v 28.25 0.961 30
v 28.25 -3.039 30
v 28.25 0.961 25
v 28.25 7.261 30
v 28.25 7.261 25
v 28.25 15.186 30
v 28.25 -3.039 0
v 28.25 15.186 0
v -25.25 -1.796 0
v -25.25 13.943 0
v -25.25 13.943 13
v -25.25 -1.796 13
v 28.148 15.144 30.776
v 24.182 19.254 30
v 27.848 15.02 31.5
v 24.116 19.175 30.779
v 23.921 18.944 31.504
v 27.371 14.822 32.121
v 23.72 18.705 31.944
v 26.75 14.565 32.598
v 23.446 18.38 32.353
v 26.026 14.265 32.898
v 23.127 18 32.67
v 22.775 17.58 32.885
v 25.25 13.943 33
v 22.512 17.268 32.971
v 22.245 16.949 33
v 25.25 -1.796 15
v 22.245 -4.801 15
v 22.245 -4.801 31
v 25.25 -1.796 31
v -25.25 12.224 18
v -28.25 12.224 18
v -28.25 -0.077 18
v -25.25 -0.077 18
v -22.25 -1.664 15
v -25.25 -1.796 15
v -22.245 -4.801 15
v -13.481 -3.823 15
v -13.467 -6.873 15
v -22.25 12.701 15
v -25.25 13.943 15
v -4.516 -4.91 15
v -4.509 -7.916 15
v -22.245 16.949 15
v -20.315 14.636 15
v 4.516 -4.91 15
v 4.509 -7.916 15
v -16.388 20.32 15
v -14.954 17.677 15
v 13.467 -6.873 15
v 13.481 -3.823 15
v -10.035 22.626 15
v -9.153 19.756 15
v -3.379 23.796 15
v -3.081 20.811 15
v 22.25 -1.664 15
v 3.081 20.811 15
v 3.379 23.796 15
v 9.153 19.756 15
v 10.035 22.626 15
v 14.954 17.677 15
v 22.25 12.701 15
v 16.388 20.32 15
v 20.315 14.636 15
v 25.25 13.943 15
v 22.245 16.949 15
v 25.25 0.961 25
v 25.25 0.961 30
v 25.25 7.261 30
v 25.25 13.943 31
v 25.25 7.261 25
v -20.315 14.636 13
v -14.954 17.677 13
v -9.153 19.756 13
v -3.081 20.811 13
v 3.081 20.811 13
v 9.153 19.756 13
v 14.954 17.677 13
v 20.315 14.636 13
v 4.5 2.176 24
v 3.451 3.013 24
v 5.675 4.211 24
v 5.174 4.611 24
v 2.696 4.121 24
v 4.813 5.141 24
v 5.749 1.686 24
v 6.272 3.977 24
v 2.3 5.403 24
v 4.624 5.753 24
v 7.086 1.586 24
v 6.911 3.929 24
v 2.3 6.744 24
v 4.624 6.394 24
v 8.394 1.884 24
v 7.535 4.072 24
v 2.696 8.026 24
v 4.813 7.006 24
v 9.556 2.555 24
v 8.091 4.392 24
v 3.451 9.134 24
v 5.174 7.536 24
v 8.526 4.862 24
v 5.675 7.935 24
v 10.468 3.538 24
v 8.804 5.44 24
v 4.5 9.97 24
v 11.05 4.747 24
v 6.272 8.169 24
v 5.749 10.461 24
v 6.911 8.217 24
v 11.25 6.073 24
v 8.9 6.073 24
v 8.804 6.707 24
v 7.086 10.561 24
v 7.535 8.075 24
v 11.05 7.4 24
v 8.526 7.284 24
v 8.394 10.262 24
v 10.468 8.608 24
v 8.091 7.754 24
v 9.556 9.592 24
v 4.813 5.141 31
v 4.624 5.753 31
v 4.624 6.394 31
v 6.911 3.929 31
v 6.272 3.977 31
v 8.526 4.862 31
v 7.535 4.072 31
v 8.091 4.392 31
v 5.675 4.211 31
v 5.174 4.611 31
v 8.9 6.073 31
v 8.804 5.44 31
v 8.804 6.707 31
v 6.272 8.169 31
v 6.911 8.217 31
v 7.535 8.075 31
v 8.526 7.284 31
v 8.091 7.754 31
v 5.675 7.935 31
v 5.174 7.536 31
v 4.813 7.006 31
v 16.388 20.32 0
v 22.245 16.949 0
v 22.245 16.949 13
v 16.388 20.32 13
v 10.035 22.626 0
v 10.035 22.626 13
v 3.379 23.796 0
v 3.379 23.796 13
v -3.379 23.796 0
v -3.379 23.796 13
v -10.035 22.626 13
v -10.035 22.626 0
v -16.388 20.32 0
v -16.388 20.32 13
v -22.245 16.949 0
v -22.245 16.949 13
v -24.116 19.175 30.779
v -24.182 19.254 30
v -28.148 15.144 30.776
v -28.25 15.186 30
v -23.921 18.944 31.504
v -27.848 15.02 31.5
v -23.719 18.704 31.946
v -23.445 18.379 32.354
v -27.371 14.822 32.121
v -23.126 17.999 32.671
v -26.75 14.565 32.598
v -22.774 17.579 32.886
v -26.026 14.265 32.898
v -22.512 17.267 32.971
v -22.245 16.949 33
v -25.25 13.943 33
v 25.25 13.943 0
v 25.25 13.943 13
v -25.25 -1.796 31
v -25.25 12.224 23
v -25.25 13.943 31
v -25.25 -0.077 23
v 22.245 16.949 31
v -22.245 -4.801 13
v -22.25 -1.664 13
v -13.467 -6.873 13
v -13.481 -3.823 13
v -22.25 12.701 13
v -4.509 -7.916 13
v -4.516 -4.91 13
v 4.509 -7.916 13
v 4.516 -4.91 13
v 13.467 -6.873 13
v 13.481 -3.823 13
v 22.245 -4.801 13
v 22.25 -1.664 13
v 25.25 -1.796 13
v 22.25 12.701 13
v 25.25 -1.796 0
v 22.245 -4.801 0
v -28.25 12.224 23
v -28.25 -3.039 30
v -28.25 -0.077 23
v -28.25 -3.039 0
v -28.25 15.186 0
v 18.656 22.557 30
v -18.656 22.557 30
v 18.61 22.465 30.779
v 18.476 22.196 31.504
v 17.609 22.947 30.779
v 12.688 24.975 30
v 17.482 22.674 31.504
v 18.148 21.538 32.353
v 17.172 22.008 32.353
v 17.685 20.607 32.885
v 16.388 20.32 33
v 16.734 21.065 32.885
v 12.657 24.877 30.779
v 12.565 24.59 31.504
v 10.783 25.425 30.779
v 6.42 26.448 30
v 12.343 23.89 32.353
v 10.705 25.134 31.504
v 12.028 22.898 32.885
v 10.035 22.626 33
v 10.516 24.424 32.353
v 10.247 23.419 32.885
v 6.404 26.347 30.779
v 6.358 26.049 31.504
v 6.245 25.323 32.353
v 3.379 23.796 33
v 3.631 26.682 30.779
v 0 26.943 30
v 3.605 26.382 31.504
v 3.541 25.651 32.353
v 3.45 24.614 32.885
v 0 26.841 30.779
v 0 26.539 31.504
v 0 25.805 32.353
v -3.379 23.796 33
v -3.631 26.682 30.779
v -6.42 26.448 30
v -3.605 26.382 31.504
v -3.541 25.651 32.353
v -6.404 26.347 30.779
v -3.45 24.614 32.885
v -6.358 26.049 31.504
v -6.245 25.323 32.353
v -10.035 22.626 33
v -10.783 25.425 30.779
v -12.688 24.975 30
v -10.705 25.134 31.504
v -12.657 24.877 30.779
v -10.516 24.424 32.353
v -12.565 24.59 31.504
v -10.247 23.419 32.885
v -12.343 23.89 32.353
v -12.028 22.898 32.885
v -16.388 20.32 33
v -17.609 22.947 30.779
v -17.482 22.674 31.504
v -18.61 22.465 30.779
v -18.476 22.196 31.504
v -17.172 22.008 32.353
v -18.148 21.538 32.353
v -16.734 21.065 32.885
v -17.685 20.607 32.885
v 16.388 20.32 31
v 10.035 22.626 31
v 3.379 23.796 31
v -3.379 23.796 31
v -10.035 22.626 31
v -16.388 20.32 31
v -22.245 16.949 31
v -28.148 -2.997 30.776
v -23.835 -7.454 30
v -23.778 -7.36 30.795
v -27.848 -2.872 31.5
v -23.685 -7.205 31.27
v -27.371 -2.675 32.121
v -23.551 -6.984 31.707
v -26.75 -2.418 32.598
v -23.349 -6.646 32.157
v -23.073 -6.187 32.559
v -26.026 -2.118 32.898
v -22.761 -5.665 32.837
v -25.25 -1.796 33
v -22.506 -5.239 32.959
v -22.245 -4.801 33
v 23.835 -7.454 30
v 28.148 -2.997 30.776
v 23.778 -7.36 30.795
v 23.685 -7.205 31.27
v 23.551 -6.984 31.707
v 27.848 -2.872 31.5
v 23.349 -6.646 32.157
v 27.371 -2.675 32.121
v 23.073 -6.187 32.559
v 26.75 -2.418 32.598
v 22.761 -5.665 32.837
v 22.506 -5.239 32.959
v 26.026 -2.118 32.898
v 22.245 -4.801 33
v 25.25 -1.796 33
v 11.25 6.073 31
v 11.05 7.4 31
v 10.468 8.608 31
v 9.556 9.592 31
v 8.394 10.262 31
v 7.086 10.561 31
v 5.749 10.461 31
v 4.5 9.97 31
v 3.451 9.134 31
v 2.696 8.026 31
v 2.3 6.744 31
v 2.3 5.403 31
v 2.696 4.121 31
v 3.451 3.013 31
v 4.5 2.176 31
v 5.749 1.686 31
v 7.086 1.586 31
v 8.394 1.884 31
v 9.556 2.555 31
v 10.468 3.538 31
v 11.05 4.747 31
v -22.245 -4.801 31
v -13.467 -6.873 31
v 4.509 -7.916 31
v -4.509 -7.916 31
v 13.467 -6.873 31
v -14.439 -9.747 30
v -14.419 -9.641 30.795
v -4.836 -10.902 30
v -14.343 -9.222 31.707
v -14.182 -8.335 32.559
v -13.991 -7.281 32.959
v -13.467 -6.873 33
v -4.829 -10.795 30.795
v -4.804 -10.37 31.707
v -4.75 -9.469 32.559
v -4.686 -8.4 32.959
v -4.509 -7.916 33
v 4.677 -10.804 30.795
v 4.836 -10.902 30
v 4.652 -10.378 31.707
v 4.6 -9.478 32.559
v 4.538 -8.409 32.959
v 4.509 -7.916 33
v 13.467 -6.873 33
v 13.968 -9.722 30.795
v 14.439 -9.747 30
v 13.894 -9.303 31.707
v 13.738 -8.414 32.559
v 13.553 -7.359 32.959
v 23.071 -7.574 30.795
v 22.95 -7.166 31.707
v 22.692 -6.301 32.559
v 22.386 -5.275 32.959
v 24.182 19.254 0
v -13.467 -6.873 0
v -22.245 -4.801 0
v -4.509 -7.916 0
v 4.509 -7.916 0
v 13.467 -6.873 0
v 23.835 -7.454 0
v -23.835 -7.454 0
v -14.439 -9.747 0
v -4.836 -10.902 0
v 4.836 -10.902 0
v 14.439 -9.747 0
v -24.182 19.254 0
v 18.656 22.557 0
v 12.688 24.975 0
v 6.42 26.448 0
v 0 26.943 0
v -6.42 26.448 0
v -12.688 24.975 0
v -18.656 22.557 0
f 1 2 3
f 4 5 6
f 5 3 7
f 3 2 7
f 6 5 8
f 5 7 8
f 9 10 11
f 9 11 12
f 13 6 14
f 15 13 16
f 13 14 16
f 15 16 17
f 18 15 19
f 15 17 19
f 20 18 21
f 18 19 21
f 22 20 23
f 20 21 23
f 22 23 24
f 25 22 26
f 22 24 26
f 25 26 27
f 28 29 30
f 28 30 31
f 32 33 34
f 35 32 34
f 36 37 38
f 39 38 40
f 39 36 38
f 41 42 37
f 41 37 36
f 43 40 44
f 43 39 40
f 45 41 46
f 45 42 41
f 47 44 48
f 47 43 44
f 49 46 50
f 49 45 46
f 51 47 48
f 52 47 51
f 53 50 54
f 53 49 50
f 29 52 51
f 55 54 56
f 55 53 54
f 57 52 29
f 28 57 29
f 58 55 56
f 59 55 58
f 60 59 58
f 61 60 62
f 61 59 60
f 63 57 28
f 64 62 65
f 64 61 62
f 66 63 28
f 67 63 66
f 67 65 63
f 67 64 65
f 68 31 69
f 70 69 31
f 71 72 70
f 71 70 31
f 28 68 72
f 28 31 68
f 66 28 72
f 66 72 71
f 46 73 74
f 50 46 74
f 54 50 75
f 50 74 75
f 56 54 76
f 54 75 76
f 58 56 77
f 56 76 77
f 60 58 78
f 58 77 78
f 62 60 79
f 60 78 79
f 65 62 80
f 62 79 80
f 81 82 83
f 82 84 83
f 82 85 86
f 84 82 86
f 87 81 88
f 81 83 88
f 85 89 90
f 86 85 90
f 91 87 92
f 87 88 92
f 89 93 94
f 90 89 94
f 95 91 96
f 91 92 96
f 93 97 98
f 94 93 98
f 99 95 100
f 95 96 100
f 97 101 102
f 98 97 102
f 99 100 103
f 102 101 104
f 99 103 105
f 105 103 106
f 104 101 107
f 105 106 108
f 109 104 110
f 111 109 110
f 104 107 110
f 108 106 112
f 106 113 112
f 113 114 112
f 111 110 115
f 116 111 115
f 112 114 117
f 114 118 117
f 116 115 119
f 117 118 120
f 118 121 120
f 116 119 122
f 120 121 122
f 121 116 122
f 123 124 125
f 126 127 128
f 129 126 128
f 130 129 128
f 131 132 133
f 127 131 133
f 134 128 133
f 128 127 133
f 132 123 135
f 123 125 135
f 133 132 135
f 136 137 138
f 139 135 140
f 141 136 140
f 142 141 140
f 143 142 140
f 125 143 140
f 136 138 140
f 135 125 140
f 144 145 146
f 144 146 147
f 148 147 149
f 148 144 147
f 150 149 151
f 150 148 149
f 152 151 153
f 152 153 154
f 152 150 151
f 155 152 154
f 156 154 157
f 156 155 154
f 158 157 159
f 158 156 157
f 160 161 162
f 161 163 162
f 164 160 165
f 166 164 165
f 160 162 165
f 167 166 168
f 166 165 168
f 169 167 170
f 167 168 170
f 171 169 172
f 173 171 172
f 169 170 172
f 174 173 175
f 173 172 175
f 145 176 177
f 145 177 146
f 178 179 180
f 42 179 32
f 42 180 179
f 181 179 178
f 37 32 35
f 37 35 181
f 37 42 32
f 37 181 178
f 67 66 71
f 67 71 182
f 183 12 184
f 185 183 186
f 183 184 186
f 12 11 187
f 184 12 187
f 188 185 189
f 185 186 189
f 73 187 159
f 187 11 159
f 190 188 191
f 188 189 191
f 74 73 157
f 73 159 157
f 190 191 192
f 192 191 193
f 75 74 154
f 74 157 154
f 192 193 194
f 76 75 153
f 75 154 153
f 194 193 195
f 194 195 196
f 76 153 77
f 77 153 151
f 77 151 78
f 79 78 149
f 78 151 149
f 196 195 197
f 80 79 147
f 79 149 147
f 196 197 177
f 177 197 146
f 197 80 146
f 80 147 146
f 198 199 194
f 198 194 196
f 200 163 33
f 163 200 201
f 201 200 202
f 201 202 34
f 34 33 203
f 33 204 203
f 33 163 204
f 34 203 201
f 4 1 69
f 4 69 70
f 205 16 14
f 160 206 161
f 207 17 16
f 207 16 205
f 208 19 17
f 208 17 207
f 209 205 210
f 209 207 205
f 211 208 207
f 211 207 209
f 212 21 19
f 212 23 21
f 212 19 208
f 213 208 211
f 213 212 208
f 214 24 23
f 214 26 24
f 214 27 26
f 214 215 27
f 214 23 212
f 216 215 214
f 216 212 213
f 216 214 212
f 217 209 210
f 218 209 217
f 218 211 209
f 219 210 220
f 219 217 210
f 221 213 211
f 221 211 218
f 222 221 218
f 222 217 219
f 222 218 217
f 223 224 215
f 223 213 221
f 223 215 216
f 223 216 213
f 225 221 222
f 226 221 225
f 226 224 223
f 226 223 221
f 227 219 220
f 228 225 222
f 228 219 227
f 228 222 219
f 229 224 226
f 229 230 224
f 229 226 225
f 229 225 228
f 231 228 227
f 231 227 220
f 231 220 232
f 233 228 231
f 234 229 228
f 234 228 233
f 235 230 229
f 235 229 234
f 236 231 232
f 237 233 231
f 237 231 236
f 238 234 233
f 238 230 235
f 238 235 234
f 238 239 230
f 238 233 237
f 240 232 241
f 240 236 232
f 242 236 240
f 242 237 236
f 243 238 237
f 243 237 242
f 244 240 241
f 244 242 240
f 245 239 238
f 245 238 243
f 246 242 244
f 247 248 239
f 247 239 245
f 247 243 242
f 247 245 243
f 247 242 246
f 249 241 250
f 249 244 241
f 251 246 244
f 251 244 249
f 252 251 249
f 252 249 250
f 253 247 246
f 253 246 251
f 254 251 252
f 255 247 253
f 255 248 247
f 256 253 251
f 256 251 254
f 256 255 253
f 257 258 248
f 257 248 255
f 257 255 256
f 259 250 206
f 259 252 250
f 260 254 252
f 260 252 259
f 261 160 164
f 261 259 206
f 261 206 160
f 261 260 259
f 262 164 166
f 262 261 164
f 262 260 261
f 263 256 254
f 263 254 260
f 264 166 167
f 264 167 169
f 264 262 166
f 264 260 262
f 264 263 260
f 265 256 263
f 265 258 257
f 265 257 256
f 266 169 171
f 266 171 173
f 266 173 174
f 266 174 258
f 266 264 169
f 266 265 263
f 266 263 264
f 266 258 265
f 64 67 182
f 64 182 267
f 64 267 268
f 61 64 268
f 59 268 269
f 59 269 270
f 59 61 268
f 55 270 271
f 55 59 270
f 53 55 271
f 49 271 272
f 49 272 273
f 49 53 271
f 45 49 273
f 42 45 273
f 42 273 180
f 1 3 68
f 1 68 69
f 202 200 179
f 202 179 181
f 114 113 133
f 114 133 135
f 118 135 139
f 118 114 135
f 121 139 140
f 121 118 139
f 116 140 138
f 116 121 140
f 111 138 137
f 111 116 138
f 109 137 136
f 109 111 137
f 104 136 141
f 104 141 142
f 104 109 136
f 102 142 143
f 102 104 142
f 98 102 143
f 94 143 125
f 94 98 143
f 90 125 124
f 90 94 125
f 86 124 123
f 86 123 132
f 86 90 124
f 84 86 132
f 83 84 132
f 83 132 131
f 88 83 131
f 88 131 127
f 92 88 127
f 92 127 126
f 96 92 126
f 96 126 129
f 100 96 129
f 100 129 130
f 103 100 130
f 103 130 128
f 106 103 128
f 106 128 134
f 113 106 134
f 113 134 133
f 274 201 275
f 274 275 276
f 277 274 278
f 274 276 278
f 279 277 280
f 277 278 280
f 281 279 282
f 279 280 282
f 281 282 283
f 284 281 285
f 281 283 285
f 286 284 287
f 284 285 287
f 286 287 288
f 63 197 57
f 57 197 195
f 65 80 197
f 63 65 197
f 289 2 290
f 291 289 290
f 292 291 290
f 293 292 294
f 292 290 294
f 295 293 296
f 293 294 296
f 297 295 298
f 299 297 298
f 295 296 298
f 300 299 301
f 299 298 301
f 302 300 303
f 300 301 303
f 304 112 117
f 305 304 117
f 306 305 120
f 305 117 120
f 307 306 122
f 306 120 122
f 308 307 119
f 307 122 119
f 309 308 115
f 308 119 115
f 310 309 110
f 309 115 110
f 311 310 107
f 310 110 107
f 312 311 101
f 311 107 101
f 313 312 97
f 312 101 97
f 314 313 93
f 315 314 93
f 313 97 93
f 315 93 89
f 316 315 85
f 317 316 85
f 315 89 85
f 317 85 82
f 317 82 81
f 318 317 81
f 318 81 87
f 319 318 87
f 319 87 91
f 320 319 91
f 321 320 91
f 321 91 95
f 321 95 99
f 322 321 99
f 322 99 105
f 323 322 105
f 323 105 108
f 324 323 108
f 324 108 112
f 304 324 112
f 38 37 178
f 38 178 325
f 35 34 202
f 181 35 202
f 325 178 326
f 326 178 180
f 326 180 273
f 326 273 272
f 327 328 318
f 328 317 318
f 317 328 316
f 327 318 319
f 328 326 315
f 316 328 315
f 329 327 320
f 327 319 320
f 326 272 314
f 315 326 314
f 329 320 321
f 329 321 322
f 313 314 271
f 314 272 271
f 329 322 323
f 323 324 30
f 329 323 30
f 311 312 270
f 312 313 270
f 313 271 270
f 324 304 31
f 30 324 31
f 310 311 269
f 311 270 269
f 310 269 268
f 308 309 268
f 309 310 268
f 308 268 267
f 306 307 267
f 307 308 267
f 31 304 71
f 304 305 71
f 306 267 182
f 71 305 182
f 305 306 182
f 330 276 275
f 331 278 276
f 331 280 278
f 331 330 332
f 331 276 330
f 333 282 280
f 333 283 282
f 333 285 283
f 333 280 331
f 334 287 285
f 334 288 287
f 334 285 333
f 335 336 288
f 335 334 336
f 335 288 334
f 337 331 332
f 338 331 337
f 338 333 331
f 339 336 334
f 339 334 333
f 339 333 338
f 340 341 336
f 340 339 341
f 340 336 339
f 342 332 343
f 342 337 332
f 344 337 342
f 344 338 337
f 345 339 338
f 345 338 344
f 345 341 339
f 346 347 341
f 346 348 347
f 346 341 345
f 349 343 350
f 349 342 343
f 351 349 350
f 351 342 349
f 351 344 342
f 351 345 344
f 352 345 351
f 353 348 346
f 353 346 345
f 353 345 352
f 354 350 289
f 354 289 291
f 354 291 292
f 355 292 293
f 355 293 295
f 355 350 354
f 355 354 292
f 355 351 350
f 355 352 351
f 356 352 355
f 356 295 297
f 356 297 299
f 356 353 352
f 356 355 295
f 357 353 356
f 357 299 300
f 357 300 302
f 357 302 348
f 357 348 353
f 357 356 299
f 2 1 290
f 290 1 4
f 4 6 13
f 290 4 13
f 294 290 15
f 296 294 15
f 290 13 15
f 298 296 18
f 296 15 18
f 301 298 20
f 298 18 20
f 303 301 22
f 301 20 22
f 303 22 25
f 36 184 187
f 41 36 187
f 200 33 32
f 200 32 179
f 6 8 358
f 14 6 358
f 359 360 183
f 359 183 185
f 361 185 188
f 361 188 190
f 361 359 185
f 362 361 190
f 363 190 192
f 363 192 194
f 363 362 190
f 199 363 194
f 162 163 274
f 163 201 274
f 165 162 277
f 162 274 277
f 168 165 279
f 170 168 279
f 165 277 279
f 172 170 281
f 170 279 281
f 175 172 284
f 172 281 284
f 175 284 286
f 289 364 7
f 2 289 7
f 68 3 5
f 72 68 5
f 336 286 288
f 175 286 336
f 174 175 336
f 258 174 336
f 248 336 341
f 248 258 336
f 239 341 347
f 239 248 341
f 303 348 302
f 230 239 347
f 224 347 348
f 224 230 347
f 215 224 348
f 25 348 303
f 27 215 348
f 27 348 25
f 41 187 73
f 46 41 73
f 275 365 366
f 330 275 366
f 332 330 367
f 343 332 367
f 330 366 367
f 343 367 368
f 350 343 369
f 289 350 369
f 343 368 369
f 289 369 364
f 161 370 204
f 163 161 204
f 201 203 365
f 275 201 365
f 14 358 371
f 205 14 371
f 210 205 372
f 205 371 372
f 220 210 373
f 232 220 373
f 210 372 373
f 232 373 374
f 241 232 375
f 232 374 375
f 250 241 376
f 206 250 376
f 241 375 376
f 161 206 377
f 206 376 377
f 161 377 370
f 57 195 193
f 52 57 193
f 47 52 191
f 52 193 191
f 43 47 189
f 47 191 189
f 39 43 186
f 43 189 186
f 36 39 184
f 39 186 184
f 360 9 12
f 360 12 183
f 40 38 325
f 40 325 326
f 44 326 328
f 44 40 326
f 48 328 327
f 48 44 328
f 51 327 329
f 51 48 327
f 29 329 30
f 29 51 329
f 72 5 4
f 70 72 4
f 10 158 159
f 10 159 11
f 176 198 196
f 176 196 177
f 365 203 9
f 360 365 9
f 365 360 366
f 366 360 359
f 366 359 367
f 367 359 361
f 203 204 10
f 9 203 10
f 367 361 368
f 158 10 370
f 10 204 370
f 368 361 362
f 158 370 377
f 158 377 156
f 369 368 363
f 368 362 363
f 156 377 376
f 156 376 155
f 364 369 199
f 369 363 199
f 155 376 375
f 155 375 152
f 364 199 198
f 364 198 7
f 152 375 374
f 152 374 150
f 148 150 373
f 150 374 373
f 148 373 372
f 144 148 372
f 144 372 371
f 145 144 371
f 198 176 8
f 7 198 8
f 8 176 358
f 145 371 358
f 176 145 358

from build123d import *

# Parameters (mm, degrees)
F0_R      = 4.5
F0_R_2    = 2.15
F1_DEPTH  = 33
F2_DEPTH  = 31
F3_DEPTH  = 15
F4_DEPTH  = 13
F5_DEPTH  = 31
F6_R      = 3
F7_DEPTH  = 24
F8_W      = 6.3
F8_H      = 5
F9_DEPTH  = 4
F10_W     = 12.3
F10_H     = 5
F11_DEPTH = 4


with BuildPart() as f1:
    # F0 (on Top) → F1 (new body)
    with BuildSketch(Plane.XY):
        with BuildLine():
            Line((28.25, -3.038874), (28.25, 15.186))
            Line((28.25, 15.186), (24.182373, 19.253627))
            ThreePointArc((24.182373, 19.253627), (0, 26.943359), (-24.182373, 19.253627))
            Line((-24.182373, 19.253627), (-28.25, 15.186))
            Line((-28.25, 15.186), (-28.25, -3.038874))
            Line((-28.25, -3.038874), (-23.834695, -7.454179))
            ThreePointArc((-23.834695, -7.454179), (0, -11.046233), (23.834695, -7.454179))
            Line((23.834695, -7.454179), (28.25, -3.038874))
        make_face()
        with BuildLine():
            Line((-22.244796, -4.801437), (-25.25, -1.796233))
            Line((-25.25, -1.796233), (-25.25, 13.943359))
            Line((-25.25, 13.943359), (-22.244796, 16.948563))
            ThreePointArc((-22.244796, 16.948563), (0, 23.943359), (22.244796, 16.948563))
            Line((22.244796, 16.948563), (25.25, 13.943359))
            Line((25.25, 13.943359), (25.25, -1.796233))
            Line((25.25, -1.796233), (22.244796, -4.801437))
            ThreePointArc((22.244796, -4.801437), (0, -8.046233), (-22.244796, -4.801437))
        make_face(mode=Mode.SUBTRACT)
        with BuildLine():
            Line((-25.25, 13.943359), (-25.25, -1.796233))
            Line((-25.25, -1.796233), (-22.244796, -4.801437))
            ThreePointArc((-22.244796, -4.801437), (0, -8.046233), (22.244796, -4.801437))
            Line((22.244796, -4.801437), (25.25, -1.796233))
            Line((25.25, -1.796233), (25.25, 13.943359))
            Line((25.25, 13.943359), (22.244796, 16.948563))
            ThreePointArc((22.244796, 16.948563), (0, 23.943359), (-22.244796, 16.948563))
            Line((-22.244796, 16.948563), (-25.25, 13.943359))
        make_face()
        with BuildLine():
            Line((20.314515, 14.636203), (22.25, 12.700719))
            Line((22.25, 12.700719), (22.25, -1.663785))
            ThreePointArc((22.25, -1.663785), (0, -5.046233), (-22.25, -1.663785))
            Line((-22.25, -1.663785), (-22.25, 12.700719))
            Line((-22.25, 12.700719), (-20.314515, 14.636203))
            ThreePointArc((-20.314515, 14.636203), (0, 20.943359), (20.314515, 14.636203))
        make_face(mode=Mode.SUBTRACT)
        with BuildLine():
            Line((22.25, -1.663785), (22.25, 12.700719))
            Line((22.25, 12.700719), (20.314515, 14.636203))
            ThreePointArc((20.314515, 14.636203), (0, 20.943359), (-20.314515, 14.636203))
            Line((-20.314515, 14.636203), (-22.25, 12.700719))
            Line((-22.25, 12.700719), (-22.25, -1.663785))
            ThreePointArc((-22.25, -1.663785), (0, -5.046233), (22.25, -1.663785))
        make_face()
        with Locations((6.75, 6.073359)):
            Circle(F0_R, mode=Mode.SUBTRACT)
        with Locations((6.75, 6.073359)):
            Circle(F0_R)
        with Locations((6.75, 6.073359)):
            Circle(F0_R_2, mode=Mode.SUBTRACT)
        with Locations((6.75, 6.073359)):
            Circle(F0_R_2)
    extrude(amount=F1_DEPTH)

    # F0 (on Top) → F2 (cut)
    with BuildSketch(Plane.XY):
        with BuildLine():
            Line((-25.25, 13.943359), (-25.25, -1.796233))
            Line((-25.25, -1.796233), (-22.244796, -4.801437))
            ThreePointArc((-22.244796, -4.801437), (0, -8.046233), (22.244796, -4.801437))
            Line((22.244796, -4.801437), (25.25, -1.796233))
            Line((25.25, -1.796233), (25.25, 13.943359))
            Line((25.25, 13.943359), (22.244796, 16.948563))
            ThreePointArc((22.244796, 16.948563), (0, 23.943359), (-22.244796, 16.948563))
            Line((-22.244796, 16.948563), (-25.25, 13.943359))
        make_face()
        with BuildLine():
            Line((20.314515, 14.636203), (22.25, 12.700719))
            Line((22.25, 12.700719), (22.25, -1.663785))
            ThreePointArc((22.25, -1.663785), (0, -5.046233), (-22.25, -1.663785))
            Line((-22.25, -1.663785), (-22.25, 12.700719))
            Line((-22.25, 12.700719), (-20.314515, 14.636203))
            ThreePointArc((-20.314515, 14.636203), (0, 20.943359), (20.314515, 14.636203))
        make_face(mode=Mode.SUBTRACT)
        with BuildLine():
            Line((22.25, -1.663785), (22.25, 12.700719))
            Line((22.25, 12.700719), (20.314515, 14.636203))
            ThreePointArc((20.314515, 14.636203), (0, 20.943359), (-20.314515, 14.636203))
            Line((-20.314515, 14.636203), (-22.25, 12.700719))
            Line((-22.25, 12.700719), (-22.25, -1.663785))
            ThreePointArc((-22.25, -1.663785), (0, -5.046233), (22.25, -1.663785))
        make_face()
        with Locations((6.75, 6.073359)):
            Circle(F0_R, mode=Mode.SUBTRACT)
    extrude(amount=F2_DEPTH, mode=Mode.SUBTRACT)

    # F0 (on Top) → F3 (join)
    with BuildSketch(Plane.XY):
        with BuildLine():
            Line((-25.25, 13.943359), (-25.25, -1.796233))
            Line((-25.25, -1.796233), (-22.244796, -4.801437))
            ThreePointArc((-22.244796, -4.801437), (0, -8.046233), (22.244796, -4.801437))
            Line((22.244796, -4.801437), (25.25, -1.796233))
            Line((25.25, -1.796233), (25.25, 13.943359))
            Line((25.25, 13.943359), (22.244796, 16.948563))
            ThreePointArc((22.244796, 16.948563), (0, 23.943359), (-22.244796, 16.948563))
            Line((-22.244796, 16.948563), (-25.25, 13.943359))
        make_face()
        with BuildLine():
            Line((20.314515, 14.636203), (22.25, 12.700719))
            Line((22.25, 12.700719), (22.25, -1.663785))
            ThreePointArc((22.25, -1.663785), (0, -5.046233), (-22.25, -1.663785))
            Line((-22.25, -1.663785), (-22.25, 12.700719))
            Line((-22.25, 12.700719), (-20.314515, 14.636203))
            ThreePointArc((-20.314515, 14.636203), (0, 20.943359), (20.314515, 14.636203))
        make_face(mode=Mode.SUBTRACT)
    extrude(amount=F3_DEPTH)

    # F0 (on Top) → F4 (cut)
    with BuildSketch(Plane.XY):
        with BuildLine():
            Line((-25.25, 13.943359), (-25.25, -1.796233))
            Line((-25.25, -1.796233), (-22.244796, -4.801437))
            ThreePointArc((-22.244796, -4.801437), (0, -8.046233), (22.244796, -4.801437))
            Line((22.244796, -4.801437), (25.25, -1.796233))
            Line((25.25, -1.796233), (25.25, 13.943359))
            Line((25.25, 13.943359), (22.244796, 16.948563))
            ThreePointArc((22.244796, 16.948563), (0, 23.943359), (-22.244796, 16.948563))
            Line((-22.244796, 16.948563), (-25.25, 13.943359))
        make_face()
        with BuildLine():
            Line((20.314515, 14.636203), (22.25, 12.700719))
            Line((22.25, 12.700719), (22.25, -1.663785))
            ThreePointArc((22.25, -1.663785), (0, -5.046233), (-22.25, -1.663785))
            Line((-22.25, -1.663785), (-22.25, 12.700719))
            Line((-22.25, 12.700719), (-20.314515, 14.636203))
            ThreePointArc((-20.314515, 14.636203), (0, 20.943359), (20.314515, 14.636203))
        make_face(mode=Mode.SUBTRACT)
    extrude(amount=F4_DEPTH, mode=Mode.SUBTRACT)

    # F0 (on Top) → F5 (cut)
    with BuildSketch(Plane.XY):
        with Locations((6.75, 6.073359)):
            Circle(F0_R_2)
    extrude(amount=F5_DEPTH, mode=Mode.SUBTRACT)

    # F6
    f6_edges = [f1.edges().sort_by_distance(p)[0] for p in [
        (0, -11.046233, 33),
        (-28.25, 6.073563, 33),
        (0, 26.943359, 33),
        (28.25, 6.073563, 33),
        (-26.042347, -5.246526, 33),
        (26.042347, -5.246526, 33),
        (26.216187, 17.219813, 33),
        (-26.216187, 17.219813, 33),
    ]]
    fillet(f6_edges, radius=F6_R)

    # F0 (on Top) → F7 (cut)
    with BuildSketch(Plane.XY):
        with Locations((6.75, 6.073359)):
            Circle(F0_R)
        with Locations((6.75, 6.073359)):
            Circle(F0_R_2, mode=Mode.SUBTRACT)
        with Locations((6.75, 6.073359)):
            Circle(F0_R_2)
    extrude(amount=F7_DEPTH, mode=Mode.SUBTRACT)

    # F8 (on face) → F9 (cut)
    with BuildSketch(Plane.YZ.offset(28.25)):
        with Locations((4.111126, 27.5)):
            Rectangle(F8_W, F8_H)
    extrude(amount=-F9_DEPTH, mode=Mode.SUBTRACT)

    # F10 (on face) → F11 (cut)
    with BuildSketch(Plane(origin=(-28.25, 0, 0), x_dir=(0, -1, 0), z_dir=(-1, 0, 0))):
        with Locations((-6.0735, 20.5)):
            Rectangle(F10_W, F10_H)
    extrude(amount=-F11_DEPTH, mode=Mode.SUBTRACT)


solid = f1.part
